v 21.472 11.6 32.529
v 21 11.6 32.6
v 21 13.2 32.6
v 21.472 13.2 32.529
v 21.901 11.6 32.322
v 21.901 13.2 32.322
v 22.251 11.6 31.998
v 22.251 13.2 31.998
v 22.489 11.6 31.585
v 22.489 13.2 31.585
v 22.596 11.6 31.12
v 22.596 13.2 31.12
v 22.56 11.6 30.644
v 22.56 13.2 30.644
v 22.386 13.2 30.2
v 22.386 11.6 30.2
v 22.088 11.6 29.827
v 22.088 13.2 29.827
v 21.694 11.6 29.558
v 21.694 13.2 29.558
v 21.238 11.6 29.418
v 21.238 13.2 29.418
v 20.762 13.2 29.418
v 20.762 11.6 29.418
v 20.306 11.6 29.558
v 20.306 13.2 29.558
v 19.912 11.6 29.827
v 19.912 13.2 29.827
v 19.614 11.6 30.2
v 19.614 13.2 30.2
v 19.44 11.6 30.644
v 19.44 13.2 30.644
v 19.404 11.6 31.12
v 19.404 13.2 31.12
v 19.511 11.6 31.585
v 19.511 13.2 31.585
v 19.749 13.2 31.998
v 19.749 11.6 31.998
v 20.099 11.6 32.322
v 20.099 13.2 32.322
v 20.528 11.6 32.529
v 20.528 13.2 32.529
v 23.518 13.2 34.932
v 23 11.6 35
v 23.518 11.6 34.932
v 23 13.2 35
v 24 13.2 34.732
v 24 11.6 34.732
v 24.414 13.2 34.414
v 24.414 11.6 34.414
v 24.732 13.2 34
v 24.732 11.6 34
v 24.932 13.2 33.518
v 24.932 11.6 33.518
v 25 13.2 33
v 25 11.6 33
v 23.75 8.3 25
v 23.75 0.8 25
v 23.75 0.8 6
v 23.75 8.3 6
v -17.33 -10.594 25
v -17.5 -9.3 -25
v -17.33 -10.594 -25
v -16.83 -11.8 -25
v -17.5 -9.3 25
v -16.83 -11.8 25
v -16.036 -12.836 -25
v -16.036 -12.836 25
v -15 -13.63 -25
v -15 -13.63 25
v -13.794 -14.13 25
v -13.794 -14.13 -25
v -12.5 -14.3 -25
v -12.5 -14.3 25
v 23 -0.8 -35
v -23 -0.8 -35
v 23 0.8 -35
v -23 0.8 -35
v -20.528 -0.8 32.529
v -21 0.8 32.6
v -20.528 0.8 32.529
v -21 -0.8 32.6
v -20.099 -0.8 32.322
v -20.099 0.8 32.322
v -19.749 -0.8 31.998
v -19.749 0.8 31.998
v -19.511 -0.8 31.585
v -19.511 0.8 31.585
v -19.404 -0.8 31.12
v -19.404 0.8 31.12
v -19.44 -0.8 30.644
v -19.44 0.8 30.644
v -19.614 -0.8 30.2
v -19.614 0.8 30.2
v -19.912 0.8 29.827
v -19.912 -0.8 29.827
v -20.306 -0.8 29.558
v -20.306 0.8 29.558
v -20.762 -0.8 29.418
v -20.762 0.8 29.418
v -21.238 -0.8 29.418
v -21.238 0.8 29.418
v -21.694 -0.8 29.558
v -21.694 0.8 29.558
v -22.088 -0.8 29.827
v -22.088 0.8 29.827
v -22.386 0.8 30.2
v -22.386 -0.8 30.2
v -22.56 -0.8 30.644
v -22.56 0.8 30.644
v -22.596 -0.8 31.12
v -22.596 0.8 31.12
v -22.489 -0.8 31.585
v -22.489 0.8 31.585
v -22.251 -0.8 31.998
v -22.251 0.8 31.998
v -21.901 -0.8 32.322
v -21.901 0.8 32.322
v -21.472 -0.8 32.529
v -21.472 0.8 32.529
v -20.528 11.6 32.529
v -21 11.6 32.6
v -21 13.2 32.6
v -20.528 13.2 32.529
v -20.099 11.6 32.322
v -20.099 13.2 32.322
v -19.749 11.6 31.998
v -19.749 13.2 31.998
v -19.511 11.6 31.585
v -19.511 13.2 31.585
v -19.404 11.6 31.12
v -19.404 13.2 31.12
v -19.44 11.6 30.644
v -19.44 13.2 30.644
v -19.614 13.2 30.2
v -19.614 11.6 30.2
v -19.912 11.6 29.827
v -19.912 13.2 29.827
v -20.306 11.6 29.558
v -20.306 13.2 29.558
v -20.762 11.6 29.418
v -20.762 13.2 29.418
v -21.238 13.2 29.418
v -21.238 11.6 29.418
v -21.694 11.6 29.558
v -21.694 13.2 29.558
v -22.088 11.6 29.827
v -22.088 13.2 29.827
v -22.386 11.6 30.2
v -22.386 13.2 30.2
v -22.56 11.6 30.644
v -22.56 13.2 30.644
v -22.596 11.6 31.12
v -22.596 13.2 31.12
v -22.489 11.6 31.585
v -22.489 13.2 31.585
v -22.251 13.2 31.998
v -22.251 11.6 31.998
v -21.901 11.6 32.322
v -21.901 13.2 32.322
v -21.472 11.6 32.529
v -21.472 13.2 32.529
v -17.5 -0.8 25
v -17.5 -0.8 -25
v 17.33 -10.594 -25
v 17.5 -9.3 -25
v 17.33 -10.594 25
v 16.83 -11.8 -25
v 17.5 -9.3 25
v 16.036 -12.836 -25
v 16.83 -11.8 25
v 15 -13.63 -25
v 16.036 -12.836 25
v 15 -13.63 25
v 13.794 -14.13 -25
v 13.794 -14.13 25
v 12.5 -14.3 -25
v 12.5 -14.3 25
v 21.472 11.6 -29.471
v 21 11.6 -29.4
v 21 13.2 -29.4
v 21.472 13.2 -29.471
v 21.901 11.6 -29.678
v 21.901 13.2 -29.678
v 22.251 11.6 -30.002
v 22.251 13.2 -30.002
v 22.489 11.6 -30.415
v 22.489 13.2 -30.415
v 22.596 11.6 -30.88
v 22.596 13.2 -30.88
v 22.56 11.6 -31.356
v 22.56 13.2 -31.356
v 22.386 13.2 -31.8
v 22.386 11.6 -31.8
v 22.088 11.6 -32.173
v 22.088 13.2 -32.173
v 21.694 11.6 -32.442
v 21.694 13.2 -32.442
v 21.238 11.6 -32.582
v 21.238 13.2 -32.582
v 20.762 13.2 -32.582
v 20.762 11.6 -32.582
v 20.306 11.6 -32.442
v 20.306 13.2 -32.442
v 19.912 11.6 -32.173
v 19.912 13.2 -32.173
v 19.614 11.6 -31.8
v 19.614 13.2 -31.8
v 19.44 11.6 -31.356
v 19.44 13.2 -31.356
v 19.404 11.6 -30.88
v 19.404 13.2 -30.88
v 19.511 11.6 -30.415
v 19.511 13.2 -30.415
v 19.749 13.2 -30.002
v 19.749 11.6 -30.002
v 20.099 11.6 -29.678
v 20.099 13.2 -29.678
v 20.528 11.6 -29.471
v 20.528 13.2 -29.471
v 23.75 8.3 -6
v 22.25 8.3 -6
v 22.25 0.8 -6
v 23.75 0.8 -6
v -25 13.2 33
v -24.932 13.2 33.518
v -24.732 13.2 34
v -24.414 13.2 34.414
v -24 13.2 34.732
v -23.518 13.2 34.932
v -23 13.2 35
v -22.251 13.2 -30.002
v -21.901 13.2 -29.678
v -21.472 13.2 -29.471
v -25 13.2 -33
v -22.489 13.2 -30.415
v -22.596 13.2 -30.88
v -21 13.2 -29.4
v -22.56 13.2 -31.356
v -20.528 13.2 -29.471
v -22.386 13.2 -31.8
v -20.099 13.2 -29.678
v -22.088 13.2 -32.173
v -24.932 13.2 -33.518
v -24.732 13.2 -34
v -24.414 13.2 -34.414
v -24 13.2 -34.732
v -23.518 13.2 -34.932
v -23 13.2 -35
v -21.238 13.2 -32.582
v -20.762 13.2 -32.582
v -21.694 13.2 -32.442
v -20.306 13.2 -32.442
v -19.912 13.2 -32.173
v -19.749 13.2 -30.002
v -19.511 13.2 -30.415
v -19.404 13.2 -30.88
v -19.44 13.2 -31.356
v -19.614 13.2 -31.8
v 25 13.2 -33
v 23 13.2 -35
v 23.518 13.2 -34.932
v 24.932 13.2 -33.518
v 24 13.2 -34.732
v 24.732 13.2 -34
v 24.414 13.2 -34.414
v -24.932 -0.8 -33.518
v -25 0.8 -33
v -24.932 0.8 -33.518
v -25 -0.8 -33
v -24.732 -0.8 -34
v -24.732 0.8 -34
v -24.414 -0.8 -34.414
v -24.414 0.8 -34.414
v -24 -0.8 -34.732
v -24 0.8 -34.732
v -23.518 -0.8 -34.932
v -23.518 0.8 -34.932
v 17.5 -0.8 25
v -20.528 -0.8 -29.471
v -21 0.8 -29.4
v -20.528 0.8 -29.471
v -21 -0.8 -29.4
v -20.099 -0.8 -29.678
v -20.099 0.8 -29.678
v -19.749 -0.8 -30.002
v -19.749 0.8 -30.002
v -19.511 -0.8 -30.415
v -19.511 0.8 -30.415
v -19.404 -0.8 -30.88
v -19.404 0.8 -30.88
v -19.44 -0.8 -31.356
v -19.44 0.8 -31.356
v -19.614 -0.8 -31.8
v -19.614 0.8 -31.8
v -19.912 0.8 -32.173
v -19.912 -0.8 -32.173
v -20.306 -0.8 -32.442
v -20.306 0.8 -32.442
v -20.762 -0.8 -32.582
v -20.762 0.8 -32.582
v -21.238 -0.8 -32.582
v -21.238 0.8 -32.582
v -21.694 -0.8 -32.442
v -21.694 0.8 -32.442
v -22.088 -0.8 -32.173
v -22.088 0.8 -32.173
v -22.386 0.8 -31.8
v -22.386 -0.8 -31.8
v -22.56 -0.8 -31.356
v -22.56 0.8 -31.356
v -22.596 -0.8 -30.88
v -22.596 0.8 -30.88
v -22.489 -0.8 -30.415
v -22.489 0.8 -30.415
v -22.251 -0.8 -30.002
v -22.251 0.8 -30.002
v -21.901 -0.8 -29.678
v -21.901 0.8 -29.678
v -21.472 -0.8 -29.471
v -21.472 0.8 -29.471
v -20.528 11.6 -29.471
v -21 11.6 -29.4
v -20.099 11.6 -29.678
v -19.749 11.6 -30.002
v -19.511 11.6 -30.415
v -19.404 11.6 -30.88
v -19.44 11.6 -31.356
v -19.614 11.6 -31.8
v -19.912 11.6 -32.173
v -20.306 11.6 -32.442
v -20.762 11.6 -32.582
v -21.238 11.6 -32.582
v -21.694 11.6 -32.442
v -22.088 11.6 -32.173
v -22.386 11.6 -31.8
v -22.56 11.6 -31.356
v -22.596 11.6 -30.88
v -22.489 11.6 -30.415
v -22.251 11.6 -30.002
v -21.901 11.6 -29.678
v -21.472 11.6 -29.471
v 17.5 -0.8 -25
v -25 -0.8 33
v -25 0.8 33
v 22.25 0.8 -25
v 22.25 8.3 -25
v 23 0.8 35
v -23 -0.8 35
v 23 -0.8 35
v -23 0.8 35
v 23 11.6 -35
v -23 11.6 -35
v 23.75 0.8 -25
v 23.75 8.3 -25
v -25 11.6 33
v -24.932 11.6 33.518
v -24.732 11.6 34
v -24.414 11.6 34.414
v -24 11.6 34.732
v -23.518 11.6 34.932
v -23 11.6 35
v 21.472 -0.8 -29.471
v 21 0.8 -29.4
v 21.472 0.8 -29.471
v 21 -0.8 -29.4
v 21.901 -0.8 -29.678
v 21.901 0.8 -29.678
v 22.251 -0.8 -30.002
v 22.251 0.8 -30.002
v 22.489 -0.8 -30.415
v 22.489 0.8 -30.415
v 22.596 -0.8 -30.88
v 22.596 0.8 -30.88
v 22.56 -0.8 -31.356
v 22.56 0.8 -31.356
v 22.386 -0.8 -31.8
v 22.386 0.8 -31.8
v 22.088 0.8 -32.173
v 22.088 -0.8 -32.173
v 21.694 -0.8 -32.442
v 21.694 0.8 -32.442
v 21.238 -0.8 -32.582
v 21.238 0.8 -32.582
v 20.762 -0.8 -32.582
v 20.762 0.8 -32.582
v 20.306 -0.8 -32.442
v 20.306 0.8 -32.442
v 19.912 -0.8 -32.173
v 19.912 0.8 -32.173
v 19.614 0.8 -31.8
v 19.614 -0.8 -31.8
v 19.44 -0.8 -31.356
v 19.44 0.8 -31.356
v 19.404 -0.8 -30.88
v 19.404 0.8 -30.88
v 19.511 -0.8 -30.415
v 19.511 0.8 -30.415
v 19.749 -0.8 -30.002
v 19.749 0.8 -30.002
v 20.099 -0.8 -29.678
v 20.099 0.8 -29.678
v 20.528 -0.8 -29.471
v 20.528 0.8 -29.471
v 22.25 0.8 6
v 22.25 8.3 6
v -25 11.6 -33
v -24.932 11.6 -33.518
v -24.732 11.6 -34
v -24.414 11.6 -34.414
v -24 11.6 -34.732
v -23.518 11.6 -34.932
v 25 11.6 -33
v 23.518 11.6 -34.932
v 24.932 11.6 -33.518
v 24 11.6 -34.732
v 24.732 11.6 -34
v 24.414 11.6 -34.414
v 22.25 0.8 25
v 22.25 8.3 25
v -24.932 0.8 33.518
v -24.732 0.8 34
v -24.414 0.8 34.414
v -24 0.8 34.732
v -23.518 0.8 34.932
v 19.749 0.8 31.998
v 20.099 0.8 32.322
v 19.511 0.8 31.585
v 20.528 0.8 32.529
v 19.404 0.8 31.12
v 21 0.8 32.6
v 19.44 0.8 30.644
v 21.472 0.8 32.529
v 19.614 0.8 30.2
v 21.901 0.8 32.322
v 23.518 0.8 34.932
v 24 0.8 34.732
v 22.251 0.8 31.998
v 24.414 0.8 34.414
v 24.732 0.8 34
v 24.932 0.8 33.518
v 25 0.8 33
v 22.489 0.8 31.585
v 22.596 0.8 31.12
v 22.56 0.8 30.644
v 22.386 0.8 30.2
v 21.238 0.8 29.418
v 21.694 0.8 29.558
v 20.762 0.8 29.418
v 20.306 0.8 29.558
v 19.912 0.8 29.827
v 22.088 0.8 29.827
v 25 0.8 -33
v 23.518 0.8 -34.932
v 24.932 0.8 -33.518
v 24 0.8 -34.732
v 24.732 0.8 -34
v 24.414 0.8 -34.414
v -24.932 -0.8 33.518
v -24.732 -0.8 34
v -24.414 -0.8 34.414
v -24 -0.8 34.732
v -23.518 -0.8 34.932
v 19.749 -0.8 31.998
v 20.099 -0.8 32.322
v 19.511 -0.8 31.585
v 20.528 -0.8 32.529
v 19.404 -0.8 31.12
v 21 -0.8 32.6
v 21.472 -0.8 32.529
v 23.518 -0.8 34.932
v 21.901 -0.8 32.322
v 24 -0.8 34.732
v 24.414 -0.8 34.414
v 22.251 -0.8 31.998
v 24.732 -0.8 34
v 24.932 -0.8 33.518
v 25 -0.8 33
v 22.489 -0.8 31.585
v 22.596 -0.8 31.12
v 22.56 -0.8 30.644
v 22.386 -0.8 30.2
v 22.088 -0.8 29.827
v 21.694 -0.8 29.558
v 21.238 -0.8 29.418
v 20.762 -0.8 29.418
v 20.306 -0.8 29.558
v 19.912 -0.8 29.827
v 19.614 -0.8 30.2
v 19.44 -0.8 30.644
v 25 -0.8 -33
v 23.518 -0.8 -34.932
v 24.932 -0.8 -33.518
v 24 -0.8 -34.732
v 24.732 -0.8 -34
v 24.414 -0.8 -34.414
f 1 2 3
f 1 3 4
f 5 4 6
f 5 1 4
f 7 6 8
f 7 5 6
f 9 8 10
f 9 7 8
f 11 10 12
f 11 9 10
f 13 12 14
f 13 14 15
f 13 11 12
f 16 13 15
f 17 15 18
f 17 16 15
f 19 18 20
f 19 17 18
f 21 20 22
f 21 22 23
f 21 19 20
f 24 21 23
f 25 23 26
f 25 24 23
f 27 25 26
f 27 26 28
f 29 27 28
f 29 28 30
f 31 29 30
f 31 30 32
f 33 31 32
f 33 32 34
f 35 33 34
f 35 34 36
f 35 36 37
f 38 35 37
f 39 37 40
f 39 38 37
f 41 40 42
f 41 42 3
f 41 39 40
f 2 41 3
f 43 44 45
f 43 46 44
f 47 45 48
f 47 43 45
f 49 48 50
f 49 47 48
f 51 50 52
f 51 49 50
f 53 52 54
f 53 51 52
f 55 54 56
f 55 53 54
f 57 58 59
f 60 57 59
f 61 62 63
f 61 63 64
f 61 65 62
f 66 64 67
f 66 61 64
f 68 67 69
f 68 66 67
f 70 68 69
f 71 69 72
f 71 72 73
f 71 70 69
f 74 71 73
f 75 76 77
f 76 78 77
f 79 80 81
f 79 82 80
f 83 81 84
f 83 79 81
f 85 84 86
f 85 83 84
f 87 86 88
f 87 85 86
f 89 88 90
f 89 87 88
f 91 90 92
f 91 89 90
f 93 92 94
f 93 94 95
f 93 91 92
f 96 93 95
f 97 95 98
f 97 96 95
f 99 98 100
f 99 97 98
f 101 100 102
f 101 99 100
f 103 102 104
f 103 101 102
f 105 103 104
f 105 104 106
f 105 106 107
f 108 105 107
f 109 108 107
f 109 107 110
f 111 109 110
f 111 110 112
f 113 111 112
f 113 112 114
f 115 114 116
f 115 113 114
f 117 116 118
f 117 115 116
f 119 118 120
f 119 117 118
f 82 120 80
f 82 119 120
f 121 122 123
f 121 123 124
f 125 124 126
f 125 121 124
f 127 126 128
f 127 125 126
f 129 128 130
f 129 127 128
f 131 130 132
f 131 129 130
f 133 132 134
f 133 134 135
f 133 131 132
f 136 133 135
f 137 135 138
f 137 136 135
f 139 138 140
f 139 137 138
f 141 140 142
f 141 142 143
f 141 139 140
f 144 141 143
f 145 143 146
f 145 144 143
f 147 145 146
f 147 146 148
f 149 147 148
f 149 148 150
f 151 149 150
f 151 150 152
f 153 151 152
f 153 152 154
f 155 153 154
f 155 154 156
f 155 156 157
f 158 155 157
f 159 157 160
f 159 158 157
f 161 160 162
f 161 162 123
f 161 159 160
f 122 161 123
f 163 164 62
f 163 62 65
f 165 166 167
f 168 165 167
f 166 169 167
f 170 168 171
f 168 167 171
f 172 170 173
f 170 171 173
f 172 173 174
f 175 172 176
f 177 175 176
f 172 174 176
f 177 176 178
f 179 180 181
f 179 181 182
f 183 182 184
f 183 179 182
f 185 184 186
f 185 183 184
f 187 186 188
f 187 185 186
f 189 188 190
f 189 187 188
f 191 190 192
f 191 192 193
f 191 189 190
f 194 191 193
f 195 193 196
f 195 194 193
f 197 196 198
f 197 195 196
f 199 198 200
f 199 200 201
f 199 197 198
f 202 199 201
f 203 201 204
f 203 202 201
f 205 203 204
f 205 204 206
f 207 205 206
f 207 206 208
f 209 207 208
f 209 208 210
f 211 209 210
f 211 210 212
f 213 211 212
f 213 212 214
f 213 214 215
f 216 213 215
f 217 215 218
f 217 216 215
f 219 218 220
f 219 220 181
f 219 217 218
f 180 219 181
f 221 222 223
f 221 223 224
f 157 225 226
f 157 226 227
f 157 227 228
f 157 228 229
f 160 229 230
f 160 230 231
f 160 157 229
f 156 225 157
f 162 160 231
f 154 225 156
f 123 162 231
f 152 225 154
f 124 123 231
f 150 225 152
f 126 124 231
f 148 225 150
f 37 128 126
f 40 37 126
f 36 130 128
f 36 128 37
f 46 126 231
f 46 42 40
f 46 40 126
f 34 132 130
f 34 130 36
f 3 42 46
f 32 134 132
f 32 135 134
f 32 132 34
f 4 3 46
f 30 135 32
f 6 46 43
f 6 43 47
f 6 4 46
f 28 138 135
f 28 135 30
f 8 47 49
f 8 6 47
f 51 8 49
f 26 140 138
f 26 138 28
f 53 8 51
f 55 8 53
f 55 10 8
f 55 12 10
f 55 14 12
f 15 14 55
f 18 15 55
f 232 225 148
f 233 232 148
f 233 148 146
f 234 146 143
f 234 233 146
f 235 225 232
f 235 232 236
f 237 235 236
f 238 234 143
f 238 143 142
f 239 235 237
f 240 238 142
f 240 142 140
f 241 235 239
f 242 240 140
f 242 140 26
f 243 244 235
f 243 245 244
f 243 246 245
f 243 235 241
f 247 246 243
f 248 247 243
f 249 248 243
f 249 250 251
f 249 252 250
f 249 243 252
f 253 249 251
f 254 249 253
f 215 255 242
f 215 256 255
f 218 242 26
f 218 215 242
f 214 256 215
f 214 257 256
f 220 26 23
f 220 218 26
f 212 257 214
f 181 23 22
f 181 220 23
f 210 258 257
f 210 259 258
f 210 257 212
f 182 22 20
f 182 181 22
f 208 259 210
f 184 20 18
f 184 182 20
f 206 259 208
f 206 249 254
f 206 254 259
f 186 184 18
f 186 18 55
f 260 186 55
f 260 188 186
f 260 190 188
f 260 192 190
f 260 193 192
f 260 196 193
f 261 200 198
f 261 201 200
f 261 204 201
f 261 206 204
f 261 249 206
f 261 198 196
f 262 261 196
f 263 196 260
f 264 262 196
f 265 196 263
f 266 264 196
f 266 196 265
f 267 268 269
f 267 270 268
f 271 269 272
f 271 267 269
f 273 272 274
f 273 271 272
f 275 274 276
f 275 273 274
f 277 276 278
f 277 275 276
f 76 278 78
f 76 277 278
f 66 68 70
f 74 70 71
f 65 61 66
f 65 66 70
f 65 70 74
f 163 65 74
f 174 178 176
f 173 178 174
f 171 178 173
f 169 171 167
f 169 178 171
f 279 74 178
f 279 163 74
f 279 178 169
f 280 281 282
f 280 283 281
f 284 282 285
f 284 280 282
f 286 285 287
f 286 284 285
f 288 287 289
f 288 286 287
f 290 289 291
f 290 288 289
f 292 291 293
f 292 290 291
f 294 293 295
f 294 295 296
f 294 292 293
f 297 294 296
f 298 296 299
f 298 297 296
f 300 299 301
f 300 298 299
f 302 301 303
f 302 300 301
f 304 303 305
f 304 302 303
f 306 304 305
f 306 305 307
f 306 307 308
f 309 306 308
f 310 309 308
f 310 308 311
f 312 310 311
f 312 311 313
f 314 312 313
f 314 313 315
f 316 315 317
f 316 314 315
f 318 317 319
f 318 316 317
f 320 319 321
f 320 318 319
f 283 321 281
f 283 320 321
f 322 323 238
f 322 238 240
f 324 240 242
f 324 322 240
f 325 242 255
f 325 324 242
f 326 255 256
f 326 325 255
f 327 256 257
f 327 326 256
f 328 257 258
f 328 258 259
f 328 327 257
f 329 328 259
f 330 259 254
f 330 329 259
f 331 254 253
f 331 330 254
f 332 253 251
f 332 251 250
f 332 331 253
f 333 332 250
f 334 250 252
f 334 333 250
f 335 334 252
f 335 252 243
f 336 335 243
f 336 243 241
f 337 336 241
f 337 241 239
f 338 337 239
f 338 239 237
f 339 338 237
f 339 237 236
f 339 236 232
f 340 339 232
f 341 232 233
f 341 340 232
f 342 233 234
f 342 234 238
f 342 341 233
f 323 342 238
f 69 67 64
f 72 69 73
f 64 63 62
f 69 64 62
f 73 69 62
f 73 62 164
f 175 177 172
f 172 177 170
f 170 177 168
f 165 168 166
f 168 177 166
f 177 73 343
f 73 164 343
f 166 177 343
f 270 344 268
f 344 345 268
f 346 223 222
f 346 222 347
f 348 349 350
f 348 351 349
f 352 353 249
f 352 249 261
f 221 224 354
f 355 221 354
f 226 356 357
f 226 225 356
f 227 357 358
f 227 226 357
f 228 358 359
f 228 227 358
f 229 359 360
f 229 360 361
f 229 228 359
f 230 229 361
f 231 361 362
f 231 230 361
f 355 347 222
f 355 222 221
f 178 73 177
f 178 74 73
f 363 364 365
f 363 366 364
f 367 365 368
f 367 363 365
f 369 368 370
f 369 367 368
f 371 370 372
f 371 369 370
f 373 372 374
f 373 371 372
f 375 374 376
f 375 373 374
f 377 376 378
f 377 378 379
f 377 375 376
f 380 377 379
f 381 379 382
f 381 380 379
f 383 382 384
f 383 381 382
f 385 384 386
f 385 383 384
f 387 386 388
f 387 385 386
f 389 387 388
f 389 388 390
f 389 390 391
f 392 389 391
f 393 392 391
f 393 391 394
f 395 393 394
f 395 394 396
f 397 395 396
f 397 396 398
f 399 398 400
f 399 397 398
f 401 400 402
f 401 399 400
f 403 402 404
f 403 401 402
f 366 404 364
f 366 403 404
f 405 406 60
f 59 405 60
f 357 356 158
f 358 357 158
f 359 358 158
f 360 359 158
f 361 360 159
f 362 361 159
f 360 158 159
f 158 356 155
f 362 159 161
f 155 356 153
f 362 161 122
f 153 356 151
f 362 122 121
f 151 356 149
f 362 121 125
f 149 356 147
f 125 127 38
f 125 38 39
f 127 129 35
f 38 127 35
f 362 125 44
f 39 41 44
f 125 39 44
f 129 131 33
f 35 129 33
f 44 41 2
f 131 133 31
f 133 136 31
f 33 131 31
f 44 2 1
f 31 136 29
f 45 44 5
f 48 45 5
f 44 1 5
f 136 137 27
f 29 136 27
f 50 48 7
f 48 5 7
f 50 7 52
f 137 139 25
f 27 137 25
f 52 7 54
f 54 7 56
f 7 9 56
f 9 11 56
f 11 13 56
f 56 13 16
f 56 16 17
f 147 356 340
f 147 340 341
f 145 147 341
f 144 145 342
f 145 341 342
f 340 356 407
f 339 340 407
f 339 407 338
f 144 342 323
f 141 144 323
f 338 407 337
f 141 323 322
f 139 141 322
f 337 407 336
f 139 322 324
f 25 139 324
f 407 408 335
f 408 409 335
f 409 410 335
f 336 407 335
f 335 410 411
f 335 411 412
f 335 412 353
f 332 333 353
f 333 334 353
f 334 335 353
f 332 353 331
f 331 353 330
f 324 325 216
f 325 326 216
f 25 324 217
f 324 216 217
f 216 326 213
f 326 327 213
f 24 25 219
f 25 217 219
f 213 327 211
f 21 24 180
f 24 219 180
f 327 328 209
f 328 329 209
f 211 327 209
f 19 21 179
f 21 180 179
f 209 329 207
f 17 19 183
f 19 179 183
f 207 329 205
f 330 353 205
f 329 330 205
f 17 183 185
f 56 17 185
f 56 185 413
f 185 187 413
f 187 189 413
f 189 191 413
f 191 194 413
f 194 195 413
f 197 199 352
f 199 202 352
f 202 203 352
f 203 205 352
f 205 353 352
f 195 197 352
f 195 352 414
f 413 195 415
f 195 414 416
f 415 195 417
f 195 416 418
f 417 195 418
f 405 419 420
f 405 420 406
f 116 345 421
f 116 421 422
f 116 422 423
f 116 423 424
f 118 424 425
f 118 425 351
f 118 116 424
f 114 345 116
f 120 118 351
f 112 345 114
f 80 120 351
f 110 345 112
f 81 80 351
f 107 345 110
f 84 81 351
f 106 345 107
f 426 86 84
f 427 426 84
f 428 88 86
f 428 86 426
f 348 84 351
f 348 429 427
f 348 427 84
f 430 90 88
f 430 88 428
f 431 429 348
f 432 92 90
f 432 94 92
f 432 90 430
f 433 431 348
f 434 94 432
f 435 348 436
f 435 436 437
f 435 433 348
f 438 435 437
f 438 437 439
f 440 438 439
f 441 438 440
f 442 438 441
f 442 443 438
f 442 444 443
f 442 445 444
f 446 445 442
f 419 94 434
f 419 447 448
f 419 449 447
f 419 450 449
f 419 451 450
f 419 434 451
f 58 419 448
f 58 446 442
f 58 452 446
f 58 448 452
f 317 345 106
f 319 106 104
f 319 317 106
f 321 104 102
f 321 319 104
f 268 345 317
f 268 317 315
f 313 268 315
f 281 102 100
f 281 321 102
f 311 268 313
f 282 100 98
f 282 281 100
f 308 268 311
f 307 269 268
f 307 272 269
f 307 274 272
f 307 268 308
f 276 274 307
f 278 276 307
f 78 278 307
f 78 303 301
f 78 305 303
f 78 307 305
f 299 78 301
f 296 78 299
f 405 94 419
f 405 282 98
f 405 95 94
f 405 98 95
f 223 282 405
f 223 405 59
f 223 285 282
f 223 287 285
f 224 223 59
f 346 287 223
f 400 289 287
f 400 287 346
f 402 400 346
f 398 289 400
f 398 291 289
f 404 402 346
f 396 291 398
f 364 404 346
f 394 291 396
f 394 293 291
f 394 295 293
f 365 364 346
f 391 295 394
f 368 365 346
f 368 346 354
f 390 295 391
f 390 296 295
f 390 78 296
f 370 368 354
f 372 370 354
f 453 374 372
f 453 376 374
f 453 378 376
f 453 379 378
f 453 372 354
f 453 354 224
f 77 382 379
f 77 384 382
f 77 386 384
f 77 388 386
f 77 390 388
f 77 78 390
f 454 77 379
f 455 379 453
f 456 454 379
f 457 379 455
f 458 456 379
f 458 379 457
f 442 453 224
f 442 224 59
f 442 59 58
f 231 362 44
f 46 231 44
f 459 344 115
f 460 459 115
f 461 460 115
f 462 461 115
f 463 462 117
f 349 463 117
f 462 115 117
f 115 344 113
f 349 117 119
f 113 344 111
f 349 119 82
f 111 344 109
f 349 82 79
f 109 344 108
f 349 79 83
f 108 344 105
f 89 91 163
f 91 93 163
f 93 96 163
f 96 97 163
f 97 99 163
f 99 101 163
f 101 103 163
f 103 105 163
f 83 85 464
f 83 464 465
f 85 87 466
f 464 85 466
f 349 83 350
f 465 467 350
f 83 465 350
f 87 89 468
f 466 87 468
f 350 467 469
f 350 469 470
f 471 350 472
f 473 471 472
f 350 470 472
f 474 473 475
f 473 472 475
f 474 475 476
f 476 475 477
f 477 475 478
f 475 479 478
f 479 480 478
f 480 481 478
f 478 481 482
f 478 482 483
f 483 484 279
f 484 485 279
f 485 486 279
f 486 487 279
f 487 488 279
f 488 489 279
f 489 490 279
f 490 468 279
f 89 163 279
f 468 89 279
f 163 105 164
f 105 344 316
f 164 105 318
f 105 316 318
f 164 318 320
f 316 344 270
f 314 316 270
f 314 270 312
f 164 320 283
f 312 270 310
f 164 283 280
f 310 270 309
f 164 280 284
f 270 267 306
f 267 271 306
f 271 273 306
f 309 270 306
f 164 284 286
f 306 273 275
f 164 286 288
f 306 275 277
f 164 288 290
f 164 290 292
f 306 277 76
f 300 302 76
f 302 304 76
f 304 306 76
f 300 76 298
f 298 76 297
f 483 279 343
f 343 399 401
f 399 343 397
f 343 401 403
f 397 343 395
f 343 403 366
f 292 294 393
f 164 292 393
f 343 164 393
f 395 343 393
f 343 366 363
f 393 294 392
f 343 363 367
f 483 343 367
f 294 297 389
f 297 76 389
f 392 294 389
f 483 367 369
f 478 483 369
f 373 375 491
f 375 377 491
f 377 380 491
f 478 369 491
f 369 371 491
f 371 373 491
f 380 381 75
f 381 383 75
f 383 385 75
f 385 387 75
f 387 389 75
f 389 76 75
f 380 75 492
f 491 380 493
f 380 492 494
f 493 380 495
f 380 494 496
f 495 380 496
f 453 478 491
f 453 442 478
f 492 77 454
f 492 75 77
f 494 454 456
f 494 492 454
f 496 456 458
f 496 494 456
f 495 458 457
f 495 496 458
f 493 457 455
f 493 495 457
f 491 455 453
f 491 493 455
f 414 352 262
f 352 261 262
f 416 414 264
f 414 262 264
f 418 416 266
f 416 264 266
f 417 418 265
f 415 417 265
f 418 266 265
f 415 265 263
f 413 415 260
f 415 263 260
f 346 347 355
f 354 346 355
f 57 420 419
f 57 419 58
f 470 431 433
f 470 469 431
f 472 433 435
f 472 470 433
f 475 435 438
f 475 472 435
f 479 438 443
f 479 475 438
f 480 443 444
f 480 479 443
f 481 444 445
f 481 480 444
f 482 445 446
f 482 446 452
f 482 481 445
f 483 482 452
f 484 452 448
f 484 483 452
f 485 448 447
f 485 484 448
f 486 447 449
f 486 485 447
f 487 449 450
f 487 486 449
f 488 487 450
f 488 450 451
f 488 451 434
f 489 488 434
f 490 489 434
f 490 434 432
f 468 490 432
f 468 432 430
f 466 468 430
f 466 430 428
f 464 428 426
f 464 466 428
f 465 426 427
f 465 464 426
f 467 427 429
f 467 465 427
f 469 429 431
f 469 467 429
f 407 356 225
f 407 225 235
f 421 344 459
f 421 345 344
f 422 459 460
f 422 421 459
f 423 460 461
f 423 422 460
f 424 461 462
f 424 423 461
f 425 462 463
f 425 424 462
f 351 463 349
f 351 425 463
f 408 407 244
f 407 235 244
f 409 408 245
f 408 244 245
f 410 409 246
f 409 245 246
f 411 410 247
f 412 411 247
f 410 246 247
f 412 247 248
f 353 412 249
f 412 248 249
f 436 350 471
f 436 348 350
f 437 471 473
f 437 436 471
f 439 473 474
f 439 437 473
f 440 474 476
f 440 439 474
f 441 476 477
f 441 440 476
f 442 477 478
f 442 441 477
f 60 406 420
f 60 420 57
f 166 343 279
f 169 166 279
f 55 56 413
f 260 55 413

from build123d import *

# Parameters (mm, degrees)
SKETCH1_W                  = 50
SKETCH1_H                  = 70
SKETCH1_R                  = 1.6
BOSS_EXTRUDE1_DEPTH        = 0.8
GPS_START                  = 11.6
SKETCH1_3_W                = 50
SKETCH1_3_H                = 70
SKETCH1_3_R                = 1.6
GPS_EXTENSION_MODULE_DEPTH = 1.6
SKETCH2_W                  = 1.5
SKETCH2_H                  = 19
HEADERS_DEPTH              = 7.5
SKETCH3_W                  = 35
SKETCH3_H                  = 50
BATTERIES_DEPTH            = 13.5
FILLET1_R                  = 2
FILLET2_R                  = 5
FILLET3_R                  = 2


with BuildPart() as part:
    # Sketch1 → Boss-Extrude1 (new, symmetric)
    with BuildSketch(Plane(origin=(0, 0, 0), x_dir=(1, 0, 0), z_dir=(0, 1, 0))):
        Rectangle(SKETCH1_W, SKETCH1_H)
        with Locations((-21, 31)):
            Circle(SKETCH1_R, mode=Mode.SUBTRACT)
        with Locations((21, 31)):
            Circle(SKETCH1_R, mode=Mode.SUBTRACT)
        with Locations((-21, -31)):
            Circle(SKETCH1_R, mode=Mode.SUBTRACT)
        with Locations((21, -31)):
            Circle(SKETCH1_R, mode=Mode.SUBTRACT)
    extrude(amount=BOSS_EXTRUDE1_DEPTH, both=True)

    # Sketch2 → Headers (add)
    with BuildSketch(Plane(origin=(0, 0.8, 0), x_dir=(1, 0, 0), z_dir=(0, 1, 0))):
        with Locations((23, 15.5)):
            Rectangle(SKETCH2_W, SKETCH2_H)
        with Locations((23, -15.5)):
            Rectangle(SKETCH2_W, SKETCH2_H)
    extrude(amount=HEADERS_DEPTH)

    # Sketch3 → Batteries (add)
    with BuildSketch(Plane.XZ.offset(0.8)):
        Rectangle(SKETCH3_W, SKETCH3_H)
    extrude(amount=BATTERIES_DEPTH)

    # Fillet1
    fillet1_edges = [part.edges().sort_by_distance(p)[0] for p in [
        (-25, 0, -35),
        (25, 0, -35),
        (25, 0, 35),
        (-25, 0, 35),
    ]]
    fillet(fillet1_edges, radius=FILLET1_R)

    # Fillet2
    fillet2_edges = [part.edges().sort_by_distance(p)[0] for p in [
        (-17.5, -14.3, 0),
        (17.5, -14.3, 0),
    ]]
    fillet(fillet2_edges, radius=FILLET2_R)


with BuildPart() as body_2:
    # Sketch1<3> → GPS extension Module (new body)
    with BuildSketch(Plane(origin=(0, 0, 0), x_dir=(1, 0, 0), z_dir=(0, 1, 0)).offset(GPS_START)):
        Rectangle(SKETCH1_3_W, SKETCH1_3_H)
        with Locations((-21, 31)):
            Circle(SKETCH1_3_R, mode=Mode.SUBTRACT)
        with Locations((21, 31)):
            Circle(SKETCH1_3_R, mode=Mode.SUBTRACT)
        with Locations((-21, -31)):
            Circle(SKETCH1_3_R, mode=Mode.SUBTRACT)
        with Locations((21, -31)):
            Circle(SKETCH1_3_R, mode=Mode.SUBTRACT)
    extrude(amount=GPS_EXTENSION_MODULE_DEPTH)

    # Fillet3
    fillet3_edges = [body_2.edges().sort_by_distance(p)[0] for p in [
        (-25, 12.4, -35),
        (25, 12.4, -35),
        (25, 12.4, 35),
        (-25, 12.4, 35),
    ]]
    fillet(fillet3_edges, radius=FILLET3_R)


solid = Compound([part.part, body_2.part])
